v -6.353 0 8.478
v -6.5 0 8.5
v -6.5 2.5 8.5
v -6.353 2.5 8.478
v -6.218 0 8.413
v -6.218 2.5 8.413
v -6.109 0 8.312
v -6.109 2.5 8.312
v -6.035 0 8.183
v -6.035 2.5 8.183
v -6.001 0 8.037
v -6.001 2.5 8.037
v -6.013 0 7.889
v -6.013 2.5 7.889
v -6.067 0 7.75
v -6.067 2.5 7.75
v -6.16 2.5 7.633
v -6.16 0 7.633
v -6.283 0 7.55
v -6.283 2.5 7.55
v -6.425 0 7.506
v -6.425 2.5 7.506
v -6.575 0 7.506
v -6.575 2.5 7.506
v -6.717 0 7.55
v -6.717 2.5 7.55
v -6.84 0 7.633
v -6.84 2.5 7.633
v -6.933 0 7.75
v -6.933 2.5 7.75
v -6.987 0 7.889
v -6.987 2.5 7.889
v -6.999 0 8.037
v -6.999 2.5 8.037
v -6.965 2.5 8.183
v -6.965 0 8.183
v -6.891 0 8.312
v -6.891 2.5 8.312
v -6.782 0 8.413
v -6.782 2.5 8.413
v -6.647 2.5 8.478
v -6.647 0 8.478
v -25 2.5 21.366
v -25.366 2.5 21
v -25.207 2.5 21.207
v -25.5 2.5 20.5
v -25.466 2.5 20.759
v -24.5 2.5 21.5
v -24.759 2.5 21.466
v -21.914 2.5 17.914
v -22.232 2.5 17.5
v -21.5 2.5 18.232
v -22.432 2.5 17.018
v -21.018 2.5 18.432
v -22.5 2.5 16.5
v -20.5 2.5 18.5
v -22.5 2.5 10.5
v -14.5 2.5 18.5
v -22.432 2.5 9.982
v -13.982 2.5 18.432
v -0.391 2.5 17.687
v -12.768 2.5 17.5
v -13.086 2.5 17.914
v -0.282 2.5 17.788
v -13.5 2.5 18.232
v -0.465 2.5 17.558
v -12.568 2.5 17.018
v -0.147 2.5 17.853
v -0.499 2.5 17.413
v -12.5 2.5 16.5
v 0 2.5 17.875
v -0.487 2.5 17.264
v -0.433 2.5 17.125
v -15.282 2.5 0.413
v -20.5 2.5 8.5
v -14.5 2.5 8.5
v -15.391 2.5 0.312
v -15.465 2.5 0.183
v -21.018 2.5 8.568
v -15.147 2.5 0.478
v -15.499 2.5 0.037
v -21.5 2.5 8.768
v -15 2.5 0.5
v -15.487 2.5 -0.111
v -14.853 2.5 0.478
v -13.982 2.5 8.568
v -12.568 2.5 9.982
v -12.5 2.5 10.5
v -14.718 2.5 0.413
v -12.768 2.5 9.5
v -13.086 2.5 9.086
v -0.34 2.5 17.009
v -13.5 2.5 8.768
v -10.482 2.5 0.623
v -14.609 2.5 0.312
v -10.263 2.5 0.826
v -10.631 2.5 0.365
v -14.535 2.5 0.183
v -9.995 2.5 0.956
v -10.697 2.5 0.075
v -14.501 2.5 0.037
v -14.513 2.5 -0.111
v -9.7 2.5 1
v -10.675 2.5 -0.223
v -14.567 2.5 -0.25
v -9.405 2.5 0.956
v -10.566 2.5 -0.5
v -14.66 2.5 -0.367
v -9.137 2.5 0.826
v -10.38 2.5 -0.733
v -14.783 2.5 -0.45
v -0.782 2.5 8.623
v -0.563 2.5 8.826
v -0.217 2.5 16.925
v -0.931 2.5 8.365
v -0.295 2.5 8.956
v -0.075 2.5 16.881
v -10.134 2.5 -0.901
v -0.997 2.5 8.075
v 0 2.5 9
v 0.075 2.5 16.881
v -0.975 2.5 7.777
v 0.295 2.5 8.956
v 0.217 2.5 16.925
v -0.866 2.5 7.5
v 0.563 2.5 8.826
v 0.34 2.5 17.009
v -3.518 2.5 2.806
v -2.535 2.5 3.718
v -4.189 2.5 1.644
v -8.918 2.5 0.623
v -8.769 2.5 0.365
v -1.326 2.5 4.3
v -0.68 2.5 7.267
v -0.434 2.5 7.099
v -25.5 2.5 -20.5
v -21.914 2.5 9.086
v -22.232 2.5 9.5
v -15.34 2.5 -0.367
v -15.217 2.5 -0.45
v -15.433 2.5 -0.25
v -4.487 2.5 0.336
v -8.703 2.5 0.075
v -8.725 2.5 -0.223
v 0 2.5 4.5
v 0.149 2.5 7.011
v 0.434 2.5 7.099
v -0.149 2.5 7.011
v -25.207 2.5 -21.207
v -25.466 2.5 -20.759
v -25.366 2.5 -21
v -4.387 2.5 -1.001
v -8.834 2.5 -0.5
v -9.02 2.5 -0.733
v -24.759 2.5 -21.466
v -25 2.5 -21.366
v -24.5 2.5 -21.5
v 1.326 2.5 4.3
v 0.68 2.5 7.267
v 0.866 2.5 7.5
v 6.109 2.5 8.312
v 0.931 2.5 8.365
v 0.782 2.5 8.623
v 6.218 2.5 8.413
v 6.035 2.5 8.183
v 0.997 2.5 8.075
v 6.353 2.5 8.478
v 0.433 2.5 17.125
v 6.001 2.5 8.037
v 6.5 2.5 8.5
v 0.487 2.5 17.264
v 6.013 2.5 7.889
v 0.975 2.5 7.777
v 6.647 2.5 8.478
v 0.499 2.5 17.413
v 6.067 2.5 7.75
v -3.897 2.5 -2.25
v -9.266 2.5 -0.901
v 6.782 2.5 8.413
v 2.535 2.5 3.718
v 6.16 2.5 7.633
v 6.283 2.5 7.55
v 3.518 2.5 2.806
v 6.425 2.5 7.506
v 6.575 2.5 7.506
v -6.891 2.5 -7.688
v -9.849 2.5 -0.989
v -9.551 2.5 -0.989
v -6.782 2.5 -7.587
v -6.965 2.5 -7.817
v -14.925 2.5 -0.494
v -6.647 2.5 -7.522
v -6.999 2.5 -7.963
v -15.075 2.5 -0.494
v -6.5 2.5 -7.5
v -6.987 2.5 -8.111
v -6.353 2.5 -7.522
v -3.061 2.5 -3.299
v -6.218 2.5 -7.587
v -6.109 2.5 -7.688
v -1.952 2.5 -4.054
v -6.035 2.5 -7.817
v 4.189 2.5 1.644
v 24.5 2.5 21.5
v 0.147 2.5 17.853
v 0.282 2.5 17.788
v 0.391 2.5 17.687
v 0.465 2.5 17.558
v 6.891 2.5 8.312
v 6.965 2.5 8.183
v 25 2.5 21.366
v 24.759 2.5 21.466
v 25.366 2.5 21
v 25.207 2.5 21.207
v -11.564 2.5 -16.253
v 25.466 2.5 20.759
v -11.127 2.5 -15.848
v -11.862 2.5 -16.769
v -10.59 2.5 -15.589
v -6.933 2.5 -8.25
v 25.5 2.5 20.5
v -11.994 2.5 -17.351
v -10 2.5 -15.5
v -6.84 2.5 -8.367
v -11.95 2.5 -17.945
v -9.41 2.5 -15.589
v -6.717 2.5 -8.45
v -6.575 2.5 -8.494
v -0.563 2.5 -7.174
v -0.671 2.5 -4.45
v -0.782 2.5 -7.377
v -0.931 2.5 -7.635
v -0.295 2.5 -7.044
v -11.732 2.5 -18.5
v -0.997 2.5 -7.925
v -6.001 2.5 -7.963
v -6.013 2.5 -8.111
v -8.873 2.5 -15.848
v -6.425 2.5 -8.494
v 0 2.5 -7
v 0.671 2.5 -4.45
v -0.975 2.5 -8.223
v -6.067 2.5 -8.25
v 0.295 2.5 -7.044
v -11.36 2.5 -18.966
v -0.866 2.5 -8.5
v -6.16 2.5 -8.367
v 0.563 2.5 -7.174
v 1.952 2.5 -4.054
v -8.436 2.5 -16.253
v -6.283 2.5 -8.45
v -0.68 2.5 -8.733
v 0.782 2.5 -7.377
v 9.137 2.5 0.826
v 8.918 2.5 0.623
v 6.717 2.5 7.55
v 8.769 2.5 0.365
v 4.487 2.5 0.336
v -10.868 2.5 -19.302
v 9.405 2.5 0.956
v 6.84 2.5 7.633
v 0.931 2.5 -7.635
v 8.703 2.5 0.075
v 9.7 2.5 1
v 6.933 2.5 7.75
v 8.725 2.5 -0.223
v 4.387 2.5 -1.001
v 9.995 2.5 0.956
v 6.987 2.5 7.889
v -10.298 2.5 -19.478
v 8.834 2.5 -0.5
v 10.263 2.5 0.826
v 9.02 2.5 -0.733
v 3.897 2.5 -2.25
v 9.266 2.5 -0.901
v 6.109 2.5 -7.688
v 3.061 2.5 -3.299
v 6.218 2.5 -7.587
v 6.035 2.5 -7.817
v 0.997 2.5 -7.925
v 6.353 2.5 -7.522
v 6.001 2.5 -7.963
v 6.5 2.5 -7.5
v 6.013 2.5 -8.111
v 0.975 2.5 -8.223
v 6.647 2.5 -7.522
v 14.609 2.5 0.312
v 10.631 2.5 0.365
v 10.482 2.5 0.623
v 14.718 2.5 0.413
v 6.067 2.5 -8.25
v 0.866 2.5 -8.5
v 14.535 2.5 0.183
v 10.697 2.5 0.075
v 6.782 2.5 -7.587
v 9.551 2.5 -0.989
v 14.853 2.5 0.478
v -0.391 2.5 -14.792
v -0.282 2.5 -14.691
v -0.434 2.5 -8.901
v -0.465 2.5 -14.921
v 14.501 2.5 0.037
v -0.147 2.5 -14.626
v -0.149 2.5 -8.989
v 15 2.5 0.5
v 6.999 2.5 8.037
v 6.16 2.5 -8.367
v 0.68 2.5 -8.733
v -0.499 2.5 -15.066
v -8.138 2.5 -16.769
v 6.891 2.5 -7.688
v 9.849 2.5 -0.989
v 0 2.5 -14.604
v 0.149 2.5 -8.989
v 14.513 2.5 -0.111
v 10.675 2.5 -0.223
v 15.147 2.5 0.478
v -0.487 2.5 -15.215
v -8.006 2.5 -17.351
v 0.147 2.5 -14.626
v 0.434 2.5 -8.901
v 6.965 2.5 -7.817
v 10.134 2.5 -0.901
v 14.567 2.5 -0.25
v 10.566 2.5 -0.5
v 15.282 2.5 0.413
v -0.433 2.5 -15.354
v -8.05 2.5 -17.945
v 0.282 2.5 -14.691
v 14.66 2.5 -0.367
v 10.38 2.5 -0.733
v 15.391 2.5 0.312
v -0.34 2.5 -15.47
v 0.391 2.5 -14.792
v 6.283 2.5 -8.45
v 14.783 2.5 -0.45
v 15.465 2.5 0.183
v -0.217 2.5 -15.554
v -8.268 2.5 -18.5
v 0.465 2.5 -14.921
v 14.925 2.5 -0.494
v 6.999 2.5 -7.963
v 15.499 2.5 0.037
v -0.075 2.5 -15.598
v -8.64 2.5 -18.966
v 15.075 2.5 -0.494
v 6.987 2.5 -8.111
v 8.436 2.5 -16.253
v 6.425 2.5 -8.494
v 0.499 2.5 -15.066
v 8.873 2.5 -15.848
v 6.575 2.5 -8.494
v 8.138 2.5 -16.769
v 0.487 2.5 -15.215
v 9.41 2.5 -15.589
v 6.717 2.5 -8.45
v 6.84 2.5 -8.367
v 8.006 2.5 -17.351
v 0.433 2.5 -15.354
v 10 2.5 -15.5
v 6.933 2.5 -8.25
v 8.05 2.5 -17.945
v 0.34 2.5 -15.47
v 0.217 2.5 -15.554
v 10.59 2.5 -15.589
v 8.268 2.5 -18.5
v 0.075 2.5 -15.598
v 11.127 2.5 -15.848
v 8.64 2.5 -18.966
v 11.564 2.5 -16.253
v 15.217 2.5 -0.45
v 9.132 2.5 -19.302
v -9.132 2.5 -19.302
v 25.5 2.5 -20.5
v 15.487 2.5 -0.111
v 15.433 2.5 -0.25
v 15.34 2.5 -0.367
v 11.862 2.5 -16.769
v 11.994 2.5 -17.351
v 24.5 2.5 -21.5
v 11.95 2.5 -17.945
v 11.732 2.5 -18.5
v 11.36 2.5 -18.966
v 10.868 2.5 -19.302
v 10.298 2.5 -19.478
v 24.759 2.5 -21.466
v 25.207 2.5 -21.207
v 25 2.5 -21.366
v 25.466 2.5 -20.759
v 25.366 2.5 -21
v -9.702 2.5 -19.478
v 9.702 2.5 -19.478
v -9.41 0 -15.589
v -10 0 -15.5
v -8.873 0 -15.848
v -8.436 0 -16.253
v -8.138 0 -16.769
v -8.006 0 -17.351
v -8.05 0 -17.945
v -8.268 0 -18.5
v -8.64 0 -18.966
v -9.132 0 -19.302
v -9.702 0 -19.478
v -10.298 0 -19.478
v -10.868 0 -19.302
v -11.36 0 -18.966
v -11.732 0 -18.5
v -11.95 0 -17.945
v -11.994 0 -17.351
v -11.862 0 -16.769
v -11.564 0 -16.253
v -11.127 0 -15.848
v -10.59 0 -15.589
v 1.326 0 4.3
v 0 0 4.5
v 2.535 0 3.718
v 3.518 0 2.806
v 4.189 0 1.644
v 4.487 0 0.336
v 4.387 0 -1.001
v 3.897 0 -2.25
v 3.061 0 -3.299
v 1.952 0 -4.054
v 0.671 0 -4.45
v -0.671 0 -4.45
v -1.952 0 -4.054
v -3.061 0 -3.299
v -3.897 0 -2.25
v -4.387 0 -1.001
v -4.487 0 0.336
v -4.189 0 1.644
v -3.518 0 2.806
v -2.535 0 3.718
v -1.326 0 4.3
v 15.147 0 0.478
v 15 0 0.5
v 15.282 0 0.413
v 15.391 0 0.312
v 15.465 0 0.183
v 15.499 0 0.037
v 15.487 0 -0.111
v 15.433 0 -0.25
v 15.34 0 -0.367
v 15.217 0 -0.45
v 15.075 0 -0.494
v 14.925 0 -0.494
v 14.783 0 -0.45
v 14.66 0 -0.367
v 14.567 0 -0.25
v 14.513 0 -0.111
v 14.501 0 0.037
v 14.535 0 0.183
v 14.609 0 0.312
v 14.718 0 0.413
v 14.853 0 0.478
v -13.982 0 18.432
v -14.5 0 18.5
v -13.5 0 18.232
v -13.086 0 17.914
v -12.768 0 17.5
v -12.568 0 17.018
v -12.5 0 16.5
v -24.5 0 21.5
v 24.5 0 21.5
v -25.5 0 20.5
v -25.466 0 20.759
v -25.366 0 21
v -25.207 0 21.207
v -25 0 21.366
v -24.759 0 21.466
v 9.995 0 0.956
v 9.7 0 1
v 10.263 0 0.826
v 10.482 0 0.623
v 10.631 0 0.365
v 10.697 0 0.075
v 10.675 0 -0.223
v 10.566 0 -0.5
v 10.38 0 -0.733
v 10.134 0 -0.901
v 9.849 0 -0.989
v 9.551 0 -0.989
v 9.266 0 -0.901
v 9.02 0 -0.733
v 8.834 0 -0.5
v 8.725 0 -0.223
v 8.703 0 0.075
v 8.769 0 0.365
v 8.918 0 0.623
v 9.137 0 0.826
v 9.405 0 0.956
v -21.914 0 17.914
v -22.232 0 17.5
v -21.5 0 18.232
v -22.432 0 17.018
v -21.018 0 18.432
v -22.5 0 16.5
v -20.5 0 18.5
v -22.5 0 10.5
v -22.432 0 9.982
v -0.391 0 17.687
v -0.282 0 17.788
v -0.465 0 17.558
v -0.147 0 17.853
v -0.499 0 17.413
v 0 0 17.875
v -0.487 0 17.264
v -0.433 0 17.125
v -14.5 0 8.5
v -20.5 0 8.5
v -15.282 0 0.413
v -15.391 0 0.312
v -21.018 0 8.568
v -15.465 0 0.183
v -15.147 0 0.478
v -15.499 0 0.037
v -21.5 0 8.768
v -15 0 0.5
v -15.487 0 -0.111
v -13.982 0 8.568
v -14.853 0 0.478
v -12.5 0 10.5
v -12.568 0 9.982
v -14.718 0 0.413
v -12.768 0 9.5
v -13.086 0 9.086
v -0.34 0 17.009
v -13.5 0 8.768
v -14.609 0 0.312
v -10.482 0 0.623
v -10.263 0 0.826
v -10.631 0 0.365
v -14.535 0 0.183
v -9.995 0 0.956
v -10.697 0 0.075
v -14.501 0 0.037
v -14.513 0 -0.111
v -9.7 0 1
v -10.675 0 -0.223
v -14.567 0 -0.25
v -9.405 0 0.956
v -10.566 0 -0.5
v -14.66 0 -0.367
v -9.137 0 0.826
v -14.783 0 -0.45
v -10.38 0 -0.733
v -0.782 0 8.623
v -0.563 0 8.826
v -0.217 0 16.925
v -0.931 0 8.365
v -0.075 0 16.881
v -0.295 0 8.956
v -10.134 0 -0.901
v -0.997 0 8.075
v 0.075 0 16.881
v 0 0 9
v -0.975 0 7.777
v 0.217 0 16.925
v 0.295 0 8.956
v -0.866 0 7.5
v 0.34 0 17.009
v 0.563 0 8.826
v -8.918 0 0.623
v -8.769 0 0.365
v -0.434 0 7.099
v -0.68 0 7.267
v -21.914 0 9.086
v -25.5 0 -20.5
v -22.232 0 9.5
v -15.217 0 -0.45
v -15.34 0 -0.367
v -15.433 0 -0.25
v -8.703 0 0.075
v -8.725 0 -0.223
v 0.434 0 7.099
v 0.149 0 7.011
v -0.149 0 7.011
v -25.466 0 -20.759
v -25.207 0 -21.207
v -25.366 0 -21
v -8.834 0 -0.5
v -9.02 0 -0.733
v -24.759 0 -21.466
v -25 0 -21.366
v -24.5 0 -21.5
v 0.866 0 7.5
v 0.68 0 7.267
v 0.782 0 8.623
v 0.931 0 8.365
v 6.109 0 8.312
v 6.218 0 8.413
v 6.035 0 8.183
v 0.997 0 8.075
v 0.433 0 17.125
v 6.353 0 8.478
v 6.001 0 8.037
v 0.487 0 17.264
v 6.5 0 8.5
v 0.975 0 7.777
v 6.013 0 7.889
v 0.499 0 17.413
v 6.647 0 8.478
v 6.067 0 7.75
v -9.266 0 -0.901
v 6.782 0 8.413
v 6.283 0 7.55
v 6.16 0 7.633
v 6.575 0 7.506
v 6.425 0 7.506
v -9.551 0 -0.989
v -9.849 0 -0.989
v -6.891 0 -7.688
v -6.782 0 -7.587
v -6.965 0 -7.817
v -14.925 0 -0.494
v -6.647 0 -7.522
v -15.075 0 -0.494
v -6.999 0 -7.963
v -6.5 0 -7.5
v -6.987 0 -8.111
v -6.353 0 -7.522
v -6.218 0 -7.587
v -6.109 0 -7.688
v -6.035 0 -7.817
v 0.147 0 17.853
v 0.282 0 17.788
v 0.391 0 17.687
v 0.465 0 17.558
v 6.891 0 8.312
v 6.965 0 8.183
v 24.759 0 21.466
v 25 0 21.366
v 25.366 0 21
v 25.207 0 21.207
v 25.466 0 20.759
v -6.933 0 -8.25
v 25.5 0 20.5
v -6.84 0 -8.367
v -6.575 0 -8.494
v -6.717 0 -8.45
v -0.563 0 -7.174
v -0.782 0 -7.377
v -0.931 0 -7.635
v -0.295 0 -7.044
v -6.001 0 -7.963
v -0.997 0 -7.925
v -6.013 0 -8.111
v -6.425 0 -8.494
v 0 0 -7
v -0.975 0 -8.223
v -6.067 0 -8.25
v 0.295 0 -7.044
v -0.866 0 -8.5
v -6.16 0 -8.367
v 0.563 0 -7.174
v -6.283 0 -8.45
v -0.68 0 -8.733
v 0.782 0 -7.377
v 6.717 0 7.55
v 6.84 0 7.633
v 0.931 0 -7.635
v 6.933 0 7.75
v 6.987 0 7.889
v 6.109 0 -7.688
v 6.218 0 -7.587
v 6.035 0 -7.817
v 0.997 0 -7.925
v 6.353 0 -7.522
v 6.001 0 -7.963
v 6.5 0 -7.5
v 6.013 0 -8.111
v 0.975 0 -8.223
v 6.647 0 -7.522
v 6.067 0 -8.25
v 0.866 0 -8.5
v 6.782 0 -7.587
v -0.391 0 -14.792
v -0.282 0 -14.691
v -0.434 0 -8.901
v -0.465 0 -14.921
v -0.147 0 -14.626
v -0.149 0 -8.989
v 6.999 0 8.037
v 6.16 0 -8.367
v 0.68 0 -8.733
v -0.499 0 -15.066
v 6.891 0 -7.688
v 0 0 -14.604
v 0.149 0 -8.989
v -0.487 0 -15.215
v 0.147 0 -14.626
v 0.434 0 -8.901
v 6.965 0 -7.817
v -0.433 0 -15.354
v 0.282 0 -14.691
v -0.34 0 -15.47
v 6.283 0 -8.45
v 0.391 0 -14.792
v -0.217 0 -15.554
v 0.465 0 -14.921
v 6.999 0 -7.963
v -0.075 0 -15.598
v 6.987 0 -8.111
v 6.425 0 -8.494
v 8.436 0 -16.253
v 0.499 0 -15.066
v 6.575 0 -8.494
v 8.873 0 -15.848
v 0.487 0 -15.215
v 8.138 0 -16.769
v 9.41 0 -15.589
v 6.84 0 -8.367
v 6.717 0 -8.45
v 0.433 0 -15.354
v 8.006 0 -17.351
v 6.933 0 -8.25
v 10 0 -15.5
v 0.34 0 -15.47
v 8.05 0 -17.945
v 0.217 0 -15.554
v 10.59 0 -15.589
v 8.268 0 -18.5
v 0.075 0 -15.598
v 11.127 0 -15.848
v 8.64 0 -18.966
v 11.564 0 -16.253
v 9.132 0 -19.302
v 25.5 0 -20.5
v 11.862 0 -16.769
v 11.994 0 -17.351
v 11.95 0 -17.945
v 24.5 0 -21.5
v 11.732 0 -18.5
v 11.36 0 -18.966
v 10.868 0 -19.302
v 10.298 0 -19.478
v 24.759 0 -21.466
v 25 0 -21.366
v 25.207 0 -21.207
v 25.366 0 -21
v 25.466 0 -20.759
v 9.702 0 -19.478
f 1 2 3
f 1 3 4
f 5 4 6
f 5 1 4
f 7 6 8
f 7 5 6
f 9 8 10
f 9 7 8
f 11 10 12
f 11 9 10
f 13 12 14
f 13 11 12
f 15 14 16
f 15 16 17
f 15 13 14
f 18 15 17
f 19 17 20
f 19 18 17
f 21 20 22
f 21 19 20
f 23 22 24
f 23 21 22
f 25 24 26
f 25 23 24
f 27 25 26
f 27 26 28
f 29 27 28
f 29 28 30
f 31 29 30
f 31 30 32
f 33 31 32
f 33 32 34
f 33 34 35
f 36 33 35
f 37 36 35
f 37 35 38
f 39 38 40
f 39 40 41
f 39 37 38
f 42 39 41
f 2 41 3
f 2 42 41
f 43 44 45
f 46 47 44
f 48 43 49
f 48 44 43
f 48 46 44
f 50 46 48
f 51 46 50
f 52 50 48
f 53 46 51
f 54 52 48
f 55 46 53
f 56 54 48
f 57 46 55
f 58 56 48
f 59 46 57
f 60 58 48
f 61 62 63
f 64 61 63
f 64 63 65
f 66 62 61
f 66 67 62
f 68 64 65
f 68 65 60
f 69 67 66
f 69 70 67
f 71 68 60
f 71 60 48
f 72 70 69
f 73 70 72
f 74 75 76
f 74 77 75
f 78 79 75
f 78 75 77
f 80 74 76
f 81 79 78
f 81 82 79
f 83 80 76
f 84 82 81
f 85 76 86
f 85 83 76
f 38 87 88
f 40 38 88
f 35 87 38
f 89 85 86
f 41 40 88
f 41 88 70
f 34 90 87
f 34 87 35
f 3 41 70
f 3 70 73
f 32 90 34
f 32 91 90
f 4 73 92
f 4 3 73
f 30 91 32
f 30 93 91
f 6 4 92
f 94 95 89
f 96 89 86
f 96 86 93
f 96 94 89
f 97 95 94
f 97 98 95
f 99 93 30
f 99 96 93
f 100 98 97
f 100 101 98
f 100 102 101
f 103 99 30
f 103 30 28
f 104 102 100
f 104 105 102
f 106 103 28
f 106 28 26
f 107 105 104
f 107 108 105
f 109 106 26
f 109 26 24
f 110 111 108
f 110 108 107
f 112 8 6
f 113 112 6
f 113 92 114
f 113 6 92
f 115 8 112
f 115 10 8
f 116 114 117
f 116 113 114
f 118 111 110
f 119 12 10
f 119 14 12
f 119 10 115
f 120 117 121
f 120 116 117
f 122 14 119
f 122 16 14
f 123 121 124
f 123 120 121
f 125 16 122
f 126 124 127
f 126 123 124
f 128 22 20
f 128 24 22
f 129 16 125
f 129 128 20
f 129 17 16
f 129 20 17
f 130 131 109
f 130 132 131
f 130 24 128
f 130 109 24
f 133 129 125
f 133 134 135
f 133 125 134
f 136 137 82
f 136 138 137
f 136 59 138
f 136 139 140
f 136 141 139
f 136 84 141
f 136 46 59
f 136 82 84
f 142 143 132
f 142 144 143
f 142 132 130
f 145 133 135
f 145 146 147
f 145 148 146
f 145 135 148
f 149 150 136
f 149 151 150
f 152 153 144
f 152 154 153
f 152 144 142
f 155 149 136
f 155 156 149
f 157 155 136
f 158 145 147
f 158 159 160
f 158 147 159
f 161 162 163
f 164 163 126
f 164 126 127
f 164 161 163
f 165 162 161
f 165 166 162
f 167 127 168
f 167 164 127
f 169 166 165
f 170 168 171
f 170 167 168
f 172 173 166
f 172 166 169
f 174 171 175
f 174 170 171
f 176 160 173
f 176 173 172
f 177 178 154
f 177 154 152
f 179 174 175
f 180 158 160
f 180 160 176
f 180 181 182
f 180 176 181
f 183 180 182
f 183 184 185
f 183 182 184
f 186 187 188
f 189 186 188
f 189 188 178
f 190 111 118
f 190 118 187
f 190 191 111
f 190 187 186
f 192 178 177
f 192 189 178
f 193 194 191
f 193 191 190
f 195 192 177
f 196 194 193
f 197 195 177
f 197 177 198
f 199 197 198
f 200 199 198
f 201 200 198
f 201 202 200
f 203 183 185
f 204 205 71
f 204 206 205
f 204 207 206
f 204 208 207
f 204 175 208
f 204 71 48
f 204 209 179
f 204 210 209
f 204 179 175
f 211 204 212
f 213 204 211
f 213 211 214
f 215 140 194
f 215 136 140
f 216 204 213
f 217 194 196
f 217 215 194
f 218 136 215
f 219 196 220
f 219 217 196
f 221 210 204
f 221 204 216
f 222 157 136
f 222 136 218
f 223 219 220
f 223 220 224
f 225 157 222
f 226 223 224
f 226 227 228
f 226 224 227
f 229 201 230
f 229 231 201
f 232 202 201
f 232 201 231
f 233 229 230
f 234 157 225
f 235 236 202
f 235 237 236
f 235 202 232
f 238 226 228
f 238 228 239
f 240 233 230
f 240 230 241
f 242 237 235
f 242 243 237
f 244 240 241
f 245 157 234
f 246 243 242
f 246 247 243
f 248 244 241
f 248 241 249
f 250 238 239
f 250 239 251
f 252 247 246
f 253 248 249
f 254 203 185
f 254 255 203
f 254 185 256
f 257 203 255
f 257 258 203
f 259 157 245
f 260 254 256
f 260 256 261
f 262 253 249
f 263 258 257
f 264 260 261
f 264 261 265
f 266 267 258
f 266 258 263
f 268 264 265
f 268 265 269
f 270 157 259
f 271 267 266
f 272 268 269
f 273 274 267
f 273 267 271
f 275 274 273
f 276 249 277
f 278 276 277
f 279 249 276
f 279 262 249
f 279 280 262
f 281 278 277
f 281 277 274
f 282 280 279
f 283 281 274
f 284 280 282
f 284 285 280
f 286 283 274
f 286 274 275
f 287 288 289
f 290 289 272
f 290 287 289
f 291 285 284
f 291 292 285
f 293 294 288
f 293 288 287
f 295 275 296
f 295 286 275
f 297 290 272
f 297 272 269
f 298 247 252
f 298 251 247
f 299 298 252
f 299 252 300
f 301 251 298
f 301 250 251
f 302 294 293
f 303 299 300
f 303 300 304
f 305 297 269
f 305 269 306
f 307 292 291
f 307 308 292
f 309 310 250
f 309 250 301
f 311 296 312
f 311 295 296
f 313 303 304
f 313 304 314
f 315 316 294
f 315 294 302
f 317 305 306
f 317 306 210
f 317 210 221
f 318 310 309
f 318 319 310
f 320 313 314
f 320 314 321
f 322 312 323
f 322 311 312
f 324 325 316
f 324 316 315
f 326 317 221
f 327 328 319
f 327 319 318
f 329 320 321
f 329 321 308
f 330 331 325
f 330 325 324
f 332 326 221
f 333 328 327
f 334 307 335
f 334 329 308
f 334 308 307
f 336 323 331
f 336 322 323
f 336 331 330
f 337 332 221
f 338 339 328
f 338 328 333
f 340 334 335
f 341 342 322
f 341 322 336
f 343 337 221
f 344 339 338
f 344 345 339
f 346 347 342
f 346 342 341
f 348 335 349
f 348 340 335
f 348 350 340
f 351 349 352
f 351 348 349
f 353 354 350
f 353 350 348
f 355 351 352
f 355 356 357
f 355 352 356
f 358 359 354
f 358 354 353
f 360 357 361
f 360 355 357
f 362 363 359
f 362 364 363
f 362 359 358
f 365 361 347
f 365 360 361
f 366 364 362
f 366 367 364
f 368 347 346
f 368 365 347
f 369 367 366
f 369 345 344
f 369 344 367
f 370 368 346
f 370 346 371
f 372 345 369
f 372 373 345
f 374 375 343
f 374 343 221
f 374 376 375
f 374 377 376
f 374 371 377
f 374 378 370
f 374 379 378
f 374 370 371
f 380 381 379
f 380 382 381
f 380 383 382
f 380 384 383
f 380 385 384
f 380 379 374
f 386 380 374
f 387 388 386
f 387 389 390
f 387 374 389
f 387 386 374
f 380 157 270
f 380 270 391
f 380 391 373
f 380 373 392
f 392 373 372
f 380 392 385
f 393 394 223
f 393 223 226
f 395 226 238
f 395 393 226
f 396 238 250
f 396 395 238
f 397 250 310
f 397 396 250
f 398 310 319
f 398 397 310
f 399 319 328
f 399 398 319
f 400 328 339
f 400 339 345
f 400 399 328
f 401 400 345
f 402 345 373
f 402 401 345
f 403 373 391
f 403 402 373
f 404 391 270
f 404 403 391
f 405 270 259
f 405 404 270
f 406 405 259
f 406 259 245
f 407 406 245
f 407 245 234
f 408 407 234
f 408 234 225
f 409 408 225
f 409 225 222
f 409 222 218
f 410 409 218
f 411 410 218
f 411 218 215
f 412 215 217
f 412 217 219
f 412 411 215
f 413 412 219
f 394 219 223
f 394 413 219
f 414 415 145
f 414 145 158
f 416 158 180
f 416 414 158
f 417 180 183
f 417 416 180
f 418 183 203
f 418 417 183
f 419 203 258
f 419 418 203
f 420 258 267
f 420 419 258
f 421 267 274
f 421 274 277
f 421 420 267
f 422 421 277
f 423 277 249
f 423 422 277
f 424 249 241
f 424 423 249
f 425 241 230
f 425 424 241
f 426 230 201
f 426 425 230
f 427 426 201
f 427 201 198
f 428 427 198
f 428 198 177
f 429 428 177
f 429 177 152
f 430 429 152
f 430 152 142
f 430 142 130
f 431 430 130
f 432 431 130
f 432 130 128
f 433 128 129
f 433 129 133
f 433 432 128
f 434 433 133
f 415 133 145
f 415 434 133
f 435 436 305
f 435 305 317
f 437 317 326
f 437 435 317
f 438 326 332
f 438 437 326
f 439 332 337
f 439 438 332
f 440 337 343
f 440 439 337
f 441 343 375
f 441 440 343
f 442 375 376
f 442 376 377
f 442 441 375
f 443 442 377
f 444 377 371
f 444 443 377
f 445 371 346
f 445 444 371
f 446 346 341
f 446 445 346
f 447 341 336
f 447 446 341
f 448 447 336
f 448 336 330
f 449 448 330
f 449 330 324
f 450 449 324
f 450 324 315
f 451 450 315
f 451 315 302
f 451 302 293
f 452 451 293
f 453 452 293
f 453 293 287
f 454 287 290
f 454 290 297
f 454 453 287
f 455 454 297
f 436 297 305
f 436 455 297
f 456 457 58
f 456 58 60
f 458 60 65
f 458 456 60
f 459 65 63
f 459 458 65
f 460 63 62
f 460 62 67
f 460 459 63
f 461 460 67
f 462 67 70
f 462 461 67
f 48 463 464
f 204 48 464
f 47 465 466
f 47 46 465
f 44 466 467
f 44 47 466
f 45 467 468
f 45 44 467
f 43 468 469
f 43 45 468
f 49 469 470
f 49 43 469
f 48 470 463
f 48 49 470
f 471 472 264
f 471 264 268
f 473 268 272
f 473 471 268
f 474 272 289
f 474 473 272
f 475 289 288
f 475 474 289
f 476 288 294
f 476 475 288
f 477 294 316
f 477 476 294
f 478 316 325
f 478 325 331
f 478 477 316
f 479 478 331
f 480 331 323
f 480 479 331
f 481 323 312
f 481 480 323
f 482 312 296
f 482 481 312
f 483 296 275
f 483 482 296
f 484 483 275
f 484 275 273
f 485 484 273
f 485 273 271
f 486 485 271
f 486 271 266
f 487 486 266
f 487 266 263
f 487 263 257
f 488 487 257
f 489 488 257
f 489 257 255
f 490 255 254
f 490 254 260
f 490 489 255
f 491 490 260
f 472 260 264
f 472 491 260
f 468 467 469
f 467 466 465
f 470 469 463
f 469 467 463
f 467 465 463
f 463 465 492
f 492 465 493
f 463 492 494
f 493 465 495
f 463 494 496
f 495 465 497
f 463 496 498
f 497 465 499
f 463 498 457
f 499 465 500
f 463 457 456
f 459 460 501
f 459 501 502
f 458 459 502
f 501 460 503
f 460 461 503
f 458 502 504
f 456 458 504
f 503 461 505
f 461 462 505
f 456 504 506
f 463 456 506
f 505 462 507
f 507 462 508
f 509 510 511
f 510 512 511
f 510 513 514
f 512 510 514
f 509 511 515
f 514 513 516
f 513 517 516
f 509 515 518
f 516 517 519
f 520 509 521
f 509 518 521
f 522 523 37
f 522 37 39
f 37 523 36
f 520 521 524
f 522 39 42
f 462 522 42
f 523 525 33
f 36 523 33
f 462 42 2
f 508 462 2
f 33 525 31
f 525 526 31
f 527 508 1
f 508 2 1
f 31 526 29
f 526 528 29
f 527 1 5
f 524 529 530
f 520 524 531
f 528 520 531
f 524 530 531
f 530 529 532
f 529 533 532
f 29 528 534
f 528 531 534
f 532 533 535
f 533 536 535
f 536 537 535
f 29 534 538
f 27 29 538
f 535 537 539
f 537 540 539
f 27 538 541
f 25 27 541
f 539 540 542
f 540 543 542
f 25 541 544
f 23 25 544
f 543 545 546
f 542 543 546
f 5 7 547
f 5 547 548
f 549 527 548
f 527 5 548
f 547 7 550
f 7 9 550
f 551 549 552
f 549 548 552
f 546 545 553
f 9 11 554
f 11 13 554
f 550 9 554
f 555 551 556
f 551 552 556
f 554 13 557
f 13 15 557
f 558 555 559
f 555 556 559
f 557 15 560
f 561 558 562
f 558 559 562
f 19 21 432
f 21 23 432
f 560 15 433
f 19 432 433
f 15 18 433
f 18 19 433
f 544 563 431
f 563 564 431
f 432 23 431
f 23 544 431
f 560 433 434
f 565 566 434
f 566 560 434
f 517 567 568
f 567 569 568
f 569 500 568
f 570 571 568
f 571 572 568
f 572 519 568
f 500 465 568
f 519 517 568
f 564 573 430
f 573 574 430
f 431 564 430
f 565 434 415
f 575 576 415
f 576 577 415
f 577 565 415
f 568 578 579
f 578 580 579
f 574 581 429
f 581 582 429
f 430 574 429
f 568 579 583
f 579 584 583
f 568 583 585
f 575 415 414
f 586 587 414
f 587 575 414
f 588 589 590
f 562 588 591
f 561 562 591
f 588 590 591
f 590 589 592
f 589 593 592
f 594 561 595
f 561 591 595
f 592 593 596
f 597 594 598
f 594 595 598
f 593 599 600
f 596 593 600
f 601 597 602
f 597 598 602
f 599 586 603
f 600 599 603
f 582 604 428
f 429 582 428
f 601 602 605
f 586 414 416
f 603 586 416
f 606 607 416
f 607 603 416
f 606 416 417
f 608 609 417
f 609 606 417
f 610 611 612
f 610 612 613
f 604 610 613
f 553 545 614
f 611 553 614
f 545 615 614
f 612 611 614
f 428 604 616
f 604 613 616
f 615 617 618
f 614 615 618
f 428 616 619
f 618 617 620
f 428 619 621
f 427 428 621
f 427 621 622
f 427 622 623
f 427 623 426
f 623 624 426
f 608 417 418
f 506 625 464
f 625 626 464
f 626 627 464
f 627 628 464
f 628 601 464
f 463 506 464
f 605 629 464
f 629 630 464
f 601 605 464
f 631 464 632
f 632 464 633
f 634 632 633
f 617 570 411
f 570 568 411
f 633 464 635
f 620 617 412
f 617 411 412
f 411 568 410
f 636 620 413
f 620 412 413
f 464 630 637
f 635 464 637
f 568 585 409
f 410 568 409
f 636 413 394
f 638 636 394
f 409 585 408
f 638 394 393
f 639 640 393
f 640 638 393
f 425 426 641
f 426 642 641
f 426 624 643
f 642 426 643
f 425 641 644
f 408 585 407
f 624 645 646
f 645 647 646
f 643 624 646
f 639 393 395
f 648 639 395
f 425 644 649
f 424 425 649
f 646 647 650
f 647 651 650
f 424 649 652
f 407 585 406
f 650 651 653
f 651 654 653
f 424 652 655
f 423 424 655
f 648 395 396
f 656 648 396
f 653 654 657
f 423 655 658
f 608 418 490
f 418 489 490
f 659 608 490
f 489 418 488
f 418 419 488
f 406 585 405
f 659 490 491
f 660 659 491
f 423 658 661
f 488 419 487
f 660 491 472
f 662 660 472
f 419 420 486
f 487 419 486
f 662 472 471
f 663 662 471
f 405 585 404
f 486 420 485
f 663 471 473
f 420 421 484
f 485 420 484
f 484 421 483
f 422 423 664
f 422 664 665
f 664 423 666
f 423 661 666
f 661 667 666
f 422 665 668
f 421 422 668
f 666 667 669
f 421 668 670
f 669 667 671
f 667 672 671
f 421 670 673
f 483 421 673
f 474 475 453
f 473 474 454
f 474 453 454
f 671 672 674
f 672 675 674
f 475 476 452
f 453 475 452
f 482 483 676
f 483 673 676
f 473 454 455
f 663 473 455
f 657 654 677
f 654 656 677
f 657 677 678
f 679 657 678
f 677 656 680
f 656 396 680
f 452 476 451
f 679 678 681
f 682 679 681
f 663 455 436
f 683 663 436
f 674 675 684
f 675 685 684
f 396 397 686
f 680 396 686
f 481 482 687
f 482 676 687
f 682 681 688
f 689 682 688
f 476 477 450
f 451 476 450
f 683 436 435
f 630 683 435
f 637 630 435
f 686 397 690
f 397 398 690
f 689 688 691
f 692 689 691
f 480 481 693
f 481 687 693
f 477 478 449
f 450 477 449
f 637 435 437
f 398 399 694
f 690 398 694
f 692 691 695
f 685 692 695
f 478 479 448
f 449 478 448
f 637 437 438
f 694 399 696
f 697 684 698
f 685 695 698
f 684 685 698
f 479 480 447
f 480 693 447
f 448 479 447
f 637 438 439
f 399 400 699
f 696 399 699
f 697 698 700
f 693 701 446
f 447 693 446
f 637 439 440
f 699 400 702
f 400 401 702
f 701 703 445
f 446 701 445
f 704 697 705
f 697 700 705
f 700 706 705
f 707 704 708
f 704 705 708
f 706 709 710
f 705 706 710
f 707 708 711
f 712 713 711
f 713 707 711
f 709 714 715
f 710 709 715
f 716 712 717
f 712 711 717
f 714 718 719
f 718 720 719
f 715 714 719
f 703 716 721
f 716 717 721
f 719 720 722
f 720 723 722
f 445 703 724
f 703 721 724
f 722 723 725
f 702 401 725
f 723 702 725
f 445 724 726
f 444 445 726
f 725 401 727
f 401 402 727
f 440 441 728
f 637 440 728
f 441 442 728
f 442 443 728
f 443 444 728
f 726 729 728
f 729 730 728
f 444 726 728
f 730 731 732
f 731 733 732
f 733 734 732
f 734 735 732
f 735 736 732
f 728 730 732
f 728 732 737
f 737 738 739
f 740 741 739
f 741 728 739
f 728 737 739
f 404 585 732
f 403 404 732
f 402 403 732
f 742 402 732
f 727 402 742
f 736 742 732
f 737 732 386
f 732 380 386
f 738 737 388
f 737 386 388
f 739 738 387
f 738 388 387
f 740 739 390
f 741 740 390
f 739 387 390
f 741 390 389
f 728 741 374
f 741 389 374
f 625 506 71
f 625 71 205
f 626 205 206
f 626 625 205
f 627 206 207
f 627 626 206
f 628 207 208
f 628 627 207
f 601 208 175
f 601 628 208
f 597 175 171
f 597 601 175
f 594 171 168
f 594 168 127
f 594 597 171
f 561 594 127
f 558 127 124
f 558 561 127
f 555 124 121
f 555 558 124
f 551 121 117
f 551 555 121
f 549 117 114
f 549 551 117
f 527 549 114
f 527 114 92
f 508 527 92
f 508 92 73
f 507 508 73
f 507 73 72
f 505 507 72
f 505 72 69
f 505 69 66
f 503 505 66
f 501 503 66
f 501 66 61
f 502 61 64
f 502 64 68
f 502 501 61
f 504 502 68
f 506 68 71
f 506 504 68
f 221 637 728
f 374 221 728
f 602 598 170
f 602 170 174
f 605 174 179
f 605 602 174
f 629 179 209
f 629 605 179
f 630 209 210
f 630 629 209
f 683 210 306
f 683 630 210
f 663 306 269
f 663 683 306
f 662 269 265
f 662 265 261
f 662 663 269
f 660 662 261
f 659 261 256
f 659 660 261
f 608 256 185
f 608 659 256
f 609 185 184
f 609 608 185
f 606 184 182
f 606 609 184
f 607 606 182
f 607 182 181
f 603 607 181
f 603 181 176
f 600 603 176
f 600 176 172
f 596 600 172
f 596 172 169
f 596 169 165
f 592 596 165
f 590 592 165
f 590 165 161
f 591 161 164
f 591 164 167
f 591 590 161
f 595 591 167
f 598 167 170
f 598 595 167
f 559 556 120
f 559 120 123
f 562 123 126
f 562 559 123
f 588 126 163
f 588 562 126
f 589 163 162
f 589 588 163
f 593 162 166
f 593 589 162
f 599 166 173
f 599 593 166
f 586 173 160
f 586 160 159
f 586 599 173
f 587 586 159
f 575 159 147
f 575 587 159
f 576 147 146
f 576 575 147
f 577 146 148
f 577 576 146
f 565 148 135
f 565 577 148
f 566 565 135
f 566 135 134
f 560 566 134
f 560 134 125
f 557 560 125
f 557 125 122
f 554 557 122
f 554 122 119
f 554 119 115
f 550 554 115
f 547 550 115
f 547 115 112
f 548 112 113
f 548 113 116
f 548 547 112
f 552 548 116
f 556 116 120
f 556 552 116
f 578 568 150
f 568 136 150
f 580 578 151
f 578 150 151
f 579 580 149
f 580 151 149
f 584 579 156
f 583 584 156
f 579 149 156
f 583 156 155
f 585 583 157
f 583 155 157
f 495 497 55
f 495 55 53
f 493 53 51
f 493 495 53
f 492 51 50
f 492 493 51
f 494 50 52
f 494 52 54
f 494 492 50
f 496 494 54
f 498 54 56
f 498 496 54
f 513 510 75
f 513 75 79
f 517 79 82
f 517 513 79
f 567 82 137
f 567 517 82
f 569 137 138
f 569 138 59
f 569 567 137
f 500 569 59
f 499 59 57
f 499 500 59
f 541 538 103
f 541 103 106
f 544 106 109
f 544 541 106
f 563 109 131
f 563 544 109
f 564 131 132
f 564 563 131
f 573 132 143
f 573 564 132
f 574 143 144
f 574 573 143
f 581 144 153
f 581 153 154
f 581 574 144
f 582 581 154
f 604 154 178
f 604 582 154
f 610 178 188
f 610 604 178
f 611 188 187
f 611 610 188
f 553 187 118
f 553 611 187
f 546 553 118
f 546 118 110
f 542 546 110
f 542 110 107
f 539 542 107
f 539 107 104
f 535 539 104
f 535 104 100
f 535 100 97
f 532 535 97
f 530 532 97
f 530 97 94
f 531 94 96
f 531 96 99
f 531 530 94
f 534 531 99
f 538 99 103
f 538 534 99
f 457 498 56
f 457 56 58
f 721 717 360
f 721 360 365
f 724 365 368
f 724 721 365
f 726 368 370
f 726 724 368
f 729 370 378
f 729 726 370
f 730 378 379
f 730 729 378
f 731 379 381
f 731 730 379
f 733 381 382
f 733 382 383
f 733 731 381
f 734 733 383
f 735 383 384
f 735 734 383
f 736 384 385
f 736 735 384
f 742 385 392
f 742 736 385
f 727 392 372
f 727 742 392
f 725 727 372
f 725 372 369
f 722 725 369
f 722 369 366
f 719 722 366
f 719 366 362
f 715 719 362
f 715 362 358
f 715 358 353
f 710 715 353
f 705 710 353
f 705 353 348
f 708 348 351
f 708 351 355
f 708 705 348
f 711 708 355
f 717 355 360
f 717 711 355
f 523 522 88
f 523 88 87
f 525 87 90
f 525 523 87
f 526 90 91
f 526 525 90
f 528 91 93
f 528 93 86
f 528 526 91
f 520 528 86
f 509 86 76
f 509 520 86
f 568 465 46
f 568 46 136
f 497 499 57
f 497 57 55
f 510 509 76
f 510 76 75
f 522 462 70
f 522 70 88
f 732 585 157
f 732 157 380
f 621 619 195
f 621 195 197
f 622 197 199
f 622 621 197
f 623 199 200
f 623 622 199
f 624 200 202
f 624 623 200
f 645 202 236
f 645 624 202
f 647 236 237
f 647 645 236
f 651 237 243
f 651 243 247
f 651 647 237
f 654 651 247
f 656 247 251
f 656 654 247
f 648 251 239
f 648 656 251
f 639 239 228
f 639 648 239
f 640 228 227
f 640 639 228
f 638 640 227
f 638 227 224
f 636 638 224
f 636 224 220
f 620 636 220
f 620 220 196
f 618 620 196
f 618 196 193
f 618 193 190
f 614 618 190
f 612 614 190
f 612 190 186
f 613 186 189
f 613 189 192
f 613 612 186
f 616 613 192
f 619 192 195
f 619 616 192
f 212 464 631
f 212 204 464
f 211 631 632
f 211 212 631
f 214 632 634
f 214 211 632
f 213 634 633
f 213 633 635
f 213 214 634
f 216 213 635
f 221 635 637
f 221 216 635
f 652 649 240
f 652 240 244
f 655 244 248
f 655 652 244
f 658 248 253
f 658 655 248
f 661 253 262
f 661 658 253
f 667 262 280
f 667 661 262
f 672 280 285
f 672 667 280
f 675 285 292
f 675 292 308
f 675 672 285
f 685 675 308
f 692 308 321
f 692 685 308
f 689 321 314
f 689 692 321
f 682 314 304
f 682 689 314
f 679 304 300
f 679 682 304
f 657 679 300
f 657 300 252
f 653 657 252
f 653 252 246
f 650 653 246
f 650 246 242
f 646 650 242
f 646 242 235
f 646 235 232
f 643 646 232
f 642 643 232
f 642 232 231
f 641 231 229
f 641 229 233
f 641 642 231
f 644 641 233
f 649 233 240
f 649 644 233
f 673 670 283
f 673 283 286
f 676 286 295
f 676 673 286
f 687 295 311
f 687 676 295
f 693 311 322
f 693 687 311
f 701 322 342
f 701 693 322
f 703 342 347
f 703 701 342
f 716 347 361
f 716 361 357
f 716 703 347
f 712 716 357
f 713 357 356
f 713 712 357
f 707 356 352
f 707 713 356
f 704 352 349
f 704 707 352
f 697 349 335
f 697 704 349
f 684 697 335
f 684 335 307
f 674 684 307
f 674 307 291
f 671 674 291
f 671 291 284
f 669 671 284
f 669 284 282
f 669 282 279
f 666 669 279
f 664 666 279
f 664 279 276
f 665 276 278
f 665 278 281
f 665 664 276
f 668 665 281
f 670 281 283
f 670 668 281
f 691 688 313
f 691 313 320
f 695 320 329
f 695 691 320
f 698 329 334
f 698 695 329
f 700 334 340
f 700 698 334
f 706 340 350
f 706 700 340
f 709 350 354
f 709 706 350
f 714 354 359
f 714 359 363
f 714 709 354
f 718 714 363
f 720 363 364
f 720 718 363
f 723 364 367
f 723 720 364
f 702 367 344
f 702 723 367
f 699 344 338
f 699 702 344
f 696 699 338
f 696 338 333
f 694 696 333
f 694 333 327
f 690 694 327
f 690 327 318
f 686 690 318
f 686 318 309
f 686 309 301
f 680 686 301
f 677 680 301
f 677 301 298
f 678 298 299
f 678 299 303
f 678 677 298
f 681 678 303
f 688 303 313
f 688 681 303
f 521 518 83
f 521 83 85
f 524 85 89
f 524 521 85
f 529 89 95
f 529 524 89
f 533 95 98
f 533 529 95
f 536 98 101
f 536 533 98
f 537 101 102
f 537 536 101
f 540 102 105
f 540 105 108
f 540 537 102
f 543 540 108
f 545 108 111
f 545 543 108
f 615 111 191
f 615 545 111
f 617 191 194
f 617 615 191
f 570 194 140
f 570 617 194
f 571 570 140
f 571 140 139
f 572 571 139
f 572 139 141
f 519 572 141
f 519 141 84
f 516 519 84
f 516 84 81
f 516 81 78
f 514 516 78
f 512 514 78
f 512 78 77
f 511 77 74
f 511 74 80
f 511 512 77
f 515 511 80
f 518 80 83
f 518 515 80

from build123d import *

# Parameters (mm, degrees)
SKETCH1_W           = 51
SKETCH1_H           = 43
SKETCH1_R           = 4.5
SKETCH1_R_2         = 1
SKETCH1_R_3         = 2
SKETCH1_R_4         = 0.5
BOSS_EXTRUDE1_DEPTH = 2.5
FILLET1_R           = 1


with BuildPart() as part:
    # Sketch1 → Boss-Extrude1 (new body)
    with BuildSketch(Plane(origin=(0, 0, 0), x_dir=(1, 0, 0), z_dir=(0, 1, 0))):
        Rectangle(SKETCH1_W, SKETCH1_H)
        with Locations(Location((0, 0, 0), (0, 0, 270))):
            Circle(SKETCH1_R, mode=Mode.SUBTRACT)
        with Locations(Location((9.7, 0, 0), (0, 0, 270))):
            Circle(SKETCH1_R_2, mode=Mode.SUBTRACT)
        with Locations(Location((-9.7, 0, 0), (0, 0, 270))):
            Circle(SKETCH1_R_2, mode=Mode.SUBTRACT)
        with Locations(Location((0, 8, 0), (0, 0, 270))):
            Circle(SKETCH1_R_2, mode=Mode.SUBTRACT)
        with Locations(Location((0, -8, 0), (0, 0, 270))):
            Circle(SKETCH1_R_2, mode=Mode.SUBTRACT)
        with Locations(Location((-10, 17.5, 0), (0, 0, 270))):
            Circle(SKETCH1_R_3, mode=Mode.SUBTRACT)
        with Locations(Location((10, 17.5, 0), (0, 0, 270))):
            Circle(SKETCH1_R_3, mode=Mode.SUBTRACT)
        with Locations(Location((-15, 0, 0), (0, 0, 270))):
            Circle(SKETCH1_R_4, mode=Mode.SUBTRACT)
        with Locations(Location((15, 0, 0), (0, 0, 270))):
            Circle(SKETCH1_R_4, mode=Mode.SUBTRACT)
        with Locations(Location((0, -17.375333522, 0), (0, 0, 270))):
            Circle(SKETCH1_R_4, mode=Mode.SUBTRACT)
        with Locations(Location((0, 15.103719109, 0), (0, 0, 270))):
            Circle(SKETCH1_R_4, mode=Mode.SUBTRACT)
        with Locations(Location((6.5, 8, 0), (0, 0, 270))):
            Circle(SKETCH1_R_4, mode=Mode.SUBTRACT)
        with Locations(Location((-6.5, 8, 0), (0, 0, 270))):
            Circle(SKETCH1_R_4, mode=Mode.SUBTRACT)
        with Locations(Location((-6.5, -8, 0), (0, 0, 270))):
            Circle(SKETCH1_R_4, mode=Mode.SUBTRACT)
        with Locations(Location((6.5, -8, 0), (0, 0, 270))):
            Circle(SKETCH1_R_4, mode=Mode.SUBTRACT)
        with BuildLine():
            Line((-20.5, -18.5), (-14.5, -18.5))
            ThreePointArc((-14.5, -18.5), (-13.085786438, -17.914213562), (-12.5, -16.5))
            Line((-12.5, -16.5), (-12.5, -10.5))
            ThreePointArc((-12.5, -10.5), (-13.085786438, -9.085786438), (-14.5, -8.5))
            Line((-14.5, -8.5), (-20.5, -8.5))
            ThreePointArc((-20.5, -8.5), (-21.914213562, -9.085786438), (-22.5, -10.5))
            Line((-22.5, -10.5), (-22.5, -16.5))
            ThreePointArc((-22.5, -16.5), (-21.914213562, -17.914213562), (-20.5, -18.5))
        make_face(mode=Mode.SUBTRACT)
    extrude(amount=BOSS_EXTRUDE1_DEPTH)

    # Fillet1
    fillet1_edges = [part.edges().sort_by_distance(p)[0] for p in [
        (25.5, 1.25, -21.5),
        (25.5, 1.25, 21.5),
        (-25.5, 1.25, 21.5),
        (-25.5, 1.25, -21.5),
    ]]
    fillet(fillet1_edges, radius=FILLET1_R)


solid = part.part
